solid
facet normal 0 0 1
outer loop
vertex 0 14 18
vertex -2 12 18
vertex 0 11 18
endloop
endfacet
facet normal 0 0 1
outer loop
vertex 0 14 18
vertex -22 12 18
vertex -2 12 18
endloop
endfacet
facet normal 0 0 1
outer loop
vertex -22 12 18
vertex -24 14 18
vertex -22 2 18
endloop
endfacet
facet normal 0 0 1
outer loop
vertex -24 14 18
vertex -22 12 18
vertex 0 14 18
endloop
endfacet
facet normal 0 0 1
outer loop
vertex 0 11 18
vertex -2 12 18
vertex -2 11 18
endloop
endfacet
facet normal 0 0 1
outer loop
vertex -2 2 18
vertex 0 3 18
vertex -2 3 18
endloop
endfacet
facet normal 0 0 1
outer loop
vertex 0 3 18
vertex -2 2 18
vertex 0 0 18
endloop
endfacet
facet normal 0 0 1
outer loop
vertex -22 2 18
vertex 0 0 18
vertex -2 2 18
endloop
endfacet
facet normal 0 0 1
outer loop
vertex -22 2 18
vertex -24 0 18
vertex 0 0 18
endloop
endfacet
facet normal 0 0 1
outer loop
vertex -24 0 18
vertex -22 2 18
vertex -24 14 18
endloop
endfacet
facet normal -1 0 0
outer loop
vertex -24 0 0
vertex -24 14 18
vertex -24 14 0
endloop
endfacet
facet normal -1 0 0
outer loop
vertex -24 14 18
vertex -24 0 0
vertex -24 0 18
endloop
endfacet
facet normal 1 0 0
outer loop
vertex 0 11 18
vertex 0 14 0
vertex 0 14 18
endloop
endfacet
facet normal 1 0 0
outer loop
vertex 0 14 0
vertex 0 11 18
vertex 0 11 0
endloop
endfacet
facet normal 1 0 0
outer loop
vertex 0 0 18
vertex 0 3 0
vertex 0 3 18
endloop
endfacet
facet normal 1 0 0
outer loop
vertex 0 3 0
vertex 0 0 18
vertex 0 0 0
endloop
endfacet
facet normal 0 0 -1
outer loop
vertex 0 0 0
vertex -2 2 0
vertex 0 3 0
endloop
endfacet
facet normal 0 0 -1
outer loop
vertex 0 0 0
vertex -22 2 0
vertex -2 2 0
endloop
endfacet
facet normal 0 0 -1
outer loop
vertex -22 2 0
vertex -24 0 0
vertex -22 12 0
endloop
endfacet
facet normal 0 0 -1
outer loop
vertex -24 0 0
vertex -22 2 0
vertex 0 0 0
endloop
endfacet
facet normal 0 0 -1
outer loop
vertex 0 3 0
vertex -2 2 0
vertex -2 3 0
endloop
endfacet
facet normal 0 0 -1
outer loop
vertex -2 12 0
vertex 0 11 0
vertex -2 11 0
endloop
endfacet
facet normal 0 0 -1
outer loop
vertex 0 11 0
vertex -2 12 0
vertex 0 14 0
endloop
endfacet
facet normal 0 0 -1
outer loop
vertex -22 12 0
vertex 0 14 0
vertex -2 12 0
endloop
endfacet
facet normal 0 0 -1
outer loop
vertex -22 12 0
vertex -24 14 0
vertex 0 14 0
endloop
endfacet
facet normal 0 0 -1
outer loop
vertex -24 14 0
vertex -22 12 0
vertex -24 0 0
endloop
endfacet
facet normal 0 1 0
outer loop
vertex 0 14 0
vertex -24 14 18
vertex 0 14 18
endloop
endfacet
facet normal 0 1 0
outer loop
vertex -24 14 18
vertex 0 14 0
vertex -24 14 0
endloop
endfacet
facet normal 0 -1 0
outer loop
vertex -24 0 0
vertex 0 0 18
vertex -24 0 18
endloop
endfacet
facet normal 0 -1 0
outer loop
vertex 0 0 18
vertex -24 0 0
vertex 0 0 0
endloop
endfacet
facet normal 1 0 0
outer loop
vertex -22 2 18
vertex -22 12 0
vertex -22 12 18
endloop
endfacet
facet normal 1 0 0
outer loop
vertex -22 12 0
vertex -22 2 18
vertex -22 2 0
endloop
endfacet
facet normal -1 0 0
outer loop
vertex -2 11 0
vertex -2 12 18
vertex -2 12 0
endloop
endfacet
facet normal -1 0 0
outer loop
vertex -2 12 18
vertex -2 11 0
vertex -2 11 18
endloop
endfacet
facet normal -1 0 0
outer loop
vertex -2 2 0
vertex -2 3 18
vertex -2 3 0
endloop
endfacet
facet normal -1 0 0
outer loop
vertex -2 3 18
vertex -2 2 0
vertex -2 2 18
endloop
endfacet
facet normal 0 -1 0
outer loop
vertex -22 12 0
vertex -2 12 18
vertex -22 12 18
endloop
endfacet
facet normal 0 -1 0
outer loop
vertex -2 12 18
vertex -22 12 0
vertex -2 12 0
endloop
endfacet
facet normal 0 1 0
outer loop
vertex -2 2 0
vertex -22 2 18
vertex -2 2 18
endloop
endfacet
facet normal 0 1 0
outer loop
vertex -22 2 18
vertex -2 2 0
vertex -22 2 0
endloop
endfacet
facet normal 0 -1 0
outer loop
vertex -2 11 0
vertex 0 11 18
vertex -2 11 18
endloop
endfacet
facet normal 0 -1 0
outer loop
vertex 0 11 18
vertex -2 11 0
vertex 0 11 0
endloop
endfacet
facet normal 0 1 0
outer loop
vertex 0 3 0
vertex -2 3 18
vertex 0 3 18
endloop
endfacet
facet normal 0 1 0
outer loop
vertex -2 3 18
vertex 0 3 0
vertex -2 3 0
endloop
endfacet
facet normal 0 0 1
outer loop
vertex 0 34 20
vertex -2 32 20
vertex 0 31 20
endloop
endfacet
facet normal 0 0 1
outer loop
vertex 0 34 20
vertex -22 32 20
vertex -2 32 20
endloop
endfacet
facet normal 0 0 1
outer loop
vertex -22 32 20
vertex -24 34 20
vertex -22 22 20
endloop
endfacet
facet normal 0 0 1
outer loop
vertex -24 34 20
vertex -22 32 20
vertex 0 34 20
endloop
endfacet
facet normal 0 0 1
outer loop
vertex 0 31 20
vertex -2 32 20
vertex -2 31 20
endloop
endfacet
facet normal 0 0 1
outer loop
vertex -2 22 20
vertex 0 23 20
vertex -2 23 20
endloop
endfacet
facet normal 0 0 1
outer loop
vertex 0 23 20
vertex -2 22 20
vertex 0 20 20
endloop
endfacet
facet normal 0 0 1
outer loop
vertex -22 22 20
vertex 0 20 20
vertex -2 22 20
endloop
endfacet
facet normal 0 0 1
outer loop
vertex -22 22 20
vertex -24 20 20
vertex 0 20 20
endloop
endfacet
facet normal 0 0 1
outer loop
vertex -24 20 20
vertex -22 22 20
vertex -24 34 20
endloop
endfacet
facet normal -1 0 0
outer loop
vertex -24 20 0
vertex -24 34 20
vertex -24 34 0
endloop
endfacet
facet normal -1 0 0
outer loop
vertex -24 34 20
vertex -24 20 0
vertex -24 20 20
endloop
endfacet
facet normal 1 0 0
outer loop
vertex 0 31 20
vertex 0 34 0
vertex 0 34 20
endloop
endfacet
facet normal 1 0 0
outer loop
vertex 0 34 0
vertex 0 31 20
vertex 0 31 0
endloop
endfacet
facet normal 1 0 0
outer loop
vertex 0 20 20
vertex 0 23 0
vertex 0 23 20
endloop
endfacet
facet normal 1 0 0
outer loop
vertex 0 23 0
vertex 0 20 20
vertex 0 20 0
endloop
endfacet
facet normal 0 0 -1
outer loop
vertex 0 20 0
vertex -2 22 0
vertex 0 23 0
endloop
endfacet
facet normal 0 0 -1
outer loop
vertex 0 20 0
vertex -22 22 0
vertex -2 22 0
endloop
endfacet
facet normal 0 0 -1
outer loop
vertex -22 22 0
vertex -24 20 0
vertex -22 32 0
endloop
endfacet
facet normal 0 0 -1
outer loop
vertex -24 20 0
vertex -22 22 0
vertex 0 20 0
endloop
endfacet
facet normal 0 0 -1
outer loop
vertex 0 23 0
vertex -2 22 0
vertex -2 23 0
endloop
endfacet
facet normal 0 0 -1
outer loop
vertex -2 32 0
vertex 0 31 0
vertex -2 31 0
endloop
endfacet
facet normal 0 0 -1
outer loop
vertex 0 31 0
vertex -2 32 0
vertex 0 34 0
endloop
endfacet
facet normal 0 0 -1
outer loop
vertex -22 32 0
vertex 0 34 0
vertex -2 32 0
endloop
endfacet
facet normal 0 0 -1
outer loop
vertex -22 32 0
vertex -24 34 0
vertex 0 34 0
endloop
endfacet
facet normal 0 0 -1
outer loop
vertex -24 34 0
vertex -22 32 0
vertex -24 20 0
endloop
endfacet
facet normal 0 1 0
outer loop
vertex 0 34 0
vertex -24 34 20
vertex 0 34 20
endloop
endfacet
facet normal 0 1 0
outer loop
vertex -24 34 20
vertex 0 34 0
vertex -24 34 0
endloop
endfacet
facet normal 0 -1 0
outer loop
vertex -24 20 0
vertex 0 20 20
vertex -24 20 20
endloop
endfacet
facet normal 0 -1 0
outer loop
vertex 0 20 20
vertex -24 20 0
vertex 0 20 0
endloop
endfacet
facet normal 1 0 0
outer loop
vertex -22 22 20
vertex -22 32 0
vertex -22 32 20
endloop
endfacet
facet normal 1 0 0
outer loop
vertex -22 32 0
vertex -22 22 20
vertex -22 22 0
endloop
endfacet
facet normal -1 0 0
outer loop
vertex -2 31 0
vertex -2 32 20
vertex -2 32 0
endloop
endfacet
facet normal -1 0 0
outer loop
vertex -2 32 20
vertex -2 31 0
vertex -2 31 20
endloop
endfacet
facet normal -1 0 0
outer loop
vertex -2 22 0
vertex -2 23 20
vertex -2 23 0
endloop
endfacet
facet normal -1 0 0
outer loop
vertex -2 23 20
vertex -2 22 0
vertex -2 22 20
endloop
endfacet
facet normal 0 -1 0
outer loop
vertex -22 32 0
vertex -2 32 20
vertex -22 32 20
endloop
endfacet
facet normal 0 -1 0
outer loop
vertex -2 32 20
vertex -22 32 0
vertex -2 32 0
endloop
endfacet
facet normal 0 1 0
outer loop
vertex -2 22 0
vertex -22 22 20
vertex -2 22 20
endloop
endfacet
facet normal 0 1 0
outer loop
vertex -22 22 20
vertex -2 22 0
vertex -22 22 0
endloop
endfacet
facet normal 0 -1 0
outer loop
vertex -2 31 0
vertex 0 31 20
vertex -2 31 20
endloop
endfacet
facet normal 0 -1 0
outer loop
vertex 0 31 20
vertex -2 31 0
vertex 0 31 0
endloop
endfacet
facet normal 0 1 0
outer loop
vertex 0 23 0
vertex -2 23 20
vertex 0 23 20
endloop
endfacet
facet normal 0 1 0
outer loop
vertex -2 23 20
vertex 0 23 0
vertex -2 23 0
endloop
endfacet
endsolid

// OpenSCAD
// ****************************************************************************
// Arm cover, can be used to fix the cables in the arm
// resize as required
// Author: Peter Holzwarth
// ****************************************************************************

// length of one arm
len1= 18; // [5:180]

// length of other arm
len2= 20; // [5:180]

rotate([0,-90,0]) cover(len1);
translate([0, 20, 0]) rotate([0,-90,0]) cover(len2);

// an arm cover, 20mm wide
module cover(width) {
    difference() {
        cube([width,14,20+4]);
        // inner part
        translate([-0.1, 2, 2]) cube([width+0.2,10,20]);
        // snapping part
        translate([-0.1, 3, -0.1]) cube([width+.2,8,2.2]);
    }
}
